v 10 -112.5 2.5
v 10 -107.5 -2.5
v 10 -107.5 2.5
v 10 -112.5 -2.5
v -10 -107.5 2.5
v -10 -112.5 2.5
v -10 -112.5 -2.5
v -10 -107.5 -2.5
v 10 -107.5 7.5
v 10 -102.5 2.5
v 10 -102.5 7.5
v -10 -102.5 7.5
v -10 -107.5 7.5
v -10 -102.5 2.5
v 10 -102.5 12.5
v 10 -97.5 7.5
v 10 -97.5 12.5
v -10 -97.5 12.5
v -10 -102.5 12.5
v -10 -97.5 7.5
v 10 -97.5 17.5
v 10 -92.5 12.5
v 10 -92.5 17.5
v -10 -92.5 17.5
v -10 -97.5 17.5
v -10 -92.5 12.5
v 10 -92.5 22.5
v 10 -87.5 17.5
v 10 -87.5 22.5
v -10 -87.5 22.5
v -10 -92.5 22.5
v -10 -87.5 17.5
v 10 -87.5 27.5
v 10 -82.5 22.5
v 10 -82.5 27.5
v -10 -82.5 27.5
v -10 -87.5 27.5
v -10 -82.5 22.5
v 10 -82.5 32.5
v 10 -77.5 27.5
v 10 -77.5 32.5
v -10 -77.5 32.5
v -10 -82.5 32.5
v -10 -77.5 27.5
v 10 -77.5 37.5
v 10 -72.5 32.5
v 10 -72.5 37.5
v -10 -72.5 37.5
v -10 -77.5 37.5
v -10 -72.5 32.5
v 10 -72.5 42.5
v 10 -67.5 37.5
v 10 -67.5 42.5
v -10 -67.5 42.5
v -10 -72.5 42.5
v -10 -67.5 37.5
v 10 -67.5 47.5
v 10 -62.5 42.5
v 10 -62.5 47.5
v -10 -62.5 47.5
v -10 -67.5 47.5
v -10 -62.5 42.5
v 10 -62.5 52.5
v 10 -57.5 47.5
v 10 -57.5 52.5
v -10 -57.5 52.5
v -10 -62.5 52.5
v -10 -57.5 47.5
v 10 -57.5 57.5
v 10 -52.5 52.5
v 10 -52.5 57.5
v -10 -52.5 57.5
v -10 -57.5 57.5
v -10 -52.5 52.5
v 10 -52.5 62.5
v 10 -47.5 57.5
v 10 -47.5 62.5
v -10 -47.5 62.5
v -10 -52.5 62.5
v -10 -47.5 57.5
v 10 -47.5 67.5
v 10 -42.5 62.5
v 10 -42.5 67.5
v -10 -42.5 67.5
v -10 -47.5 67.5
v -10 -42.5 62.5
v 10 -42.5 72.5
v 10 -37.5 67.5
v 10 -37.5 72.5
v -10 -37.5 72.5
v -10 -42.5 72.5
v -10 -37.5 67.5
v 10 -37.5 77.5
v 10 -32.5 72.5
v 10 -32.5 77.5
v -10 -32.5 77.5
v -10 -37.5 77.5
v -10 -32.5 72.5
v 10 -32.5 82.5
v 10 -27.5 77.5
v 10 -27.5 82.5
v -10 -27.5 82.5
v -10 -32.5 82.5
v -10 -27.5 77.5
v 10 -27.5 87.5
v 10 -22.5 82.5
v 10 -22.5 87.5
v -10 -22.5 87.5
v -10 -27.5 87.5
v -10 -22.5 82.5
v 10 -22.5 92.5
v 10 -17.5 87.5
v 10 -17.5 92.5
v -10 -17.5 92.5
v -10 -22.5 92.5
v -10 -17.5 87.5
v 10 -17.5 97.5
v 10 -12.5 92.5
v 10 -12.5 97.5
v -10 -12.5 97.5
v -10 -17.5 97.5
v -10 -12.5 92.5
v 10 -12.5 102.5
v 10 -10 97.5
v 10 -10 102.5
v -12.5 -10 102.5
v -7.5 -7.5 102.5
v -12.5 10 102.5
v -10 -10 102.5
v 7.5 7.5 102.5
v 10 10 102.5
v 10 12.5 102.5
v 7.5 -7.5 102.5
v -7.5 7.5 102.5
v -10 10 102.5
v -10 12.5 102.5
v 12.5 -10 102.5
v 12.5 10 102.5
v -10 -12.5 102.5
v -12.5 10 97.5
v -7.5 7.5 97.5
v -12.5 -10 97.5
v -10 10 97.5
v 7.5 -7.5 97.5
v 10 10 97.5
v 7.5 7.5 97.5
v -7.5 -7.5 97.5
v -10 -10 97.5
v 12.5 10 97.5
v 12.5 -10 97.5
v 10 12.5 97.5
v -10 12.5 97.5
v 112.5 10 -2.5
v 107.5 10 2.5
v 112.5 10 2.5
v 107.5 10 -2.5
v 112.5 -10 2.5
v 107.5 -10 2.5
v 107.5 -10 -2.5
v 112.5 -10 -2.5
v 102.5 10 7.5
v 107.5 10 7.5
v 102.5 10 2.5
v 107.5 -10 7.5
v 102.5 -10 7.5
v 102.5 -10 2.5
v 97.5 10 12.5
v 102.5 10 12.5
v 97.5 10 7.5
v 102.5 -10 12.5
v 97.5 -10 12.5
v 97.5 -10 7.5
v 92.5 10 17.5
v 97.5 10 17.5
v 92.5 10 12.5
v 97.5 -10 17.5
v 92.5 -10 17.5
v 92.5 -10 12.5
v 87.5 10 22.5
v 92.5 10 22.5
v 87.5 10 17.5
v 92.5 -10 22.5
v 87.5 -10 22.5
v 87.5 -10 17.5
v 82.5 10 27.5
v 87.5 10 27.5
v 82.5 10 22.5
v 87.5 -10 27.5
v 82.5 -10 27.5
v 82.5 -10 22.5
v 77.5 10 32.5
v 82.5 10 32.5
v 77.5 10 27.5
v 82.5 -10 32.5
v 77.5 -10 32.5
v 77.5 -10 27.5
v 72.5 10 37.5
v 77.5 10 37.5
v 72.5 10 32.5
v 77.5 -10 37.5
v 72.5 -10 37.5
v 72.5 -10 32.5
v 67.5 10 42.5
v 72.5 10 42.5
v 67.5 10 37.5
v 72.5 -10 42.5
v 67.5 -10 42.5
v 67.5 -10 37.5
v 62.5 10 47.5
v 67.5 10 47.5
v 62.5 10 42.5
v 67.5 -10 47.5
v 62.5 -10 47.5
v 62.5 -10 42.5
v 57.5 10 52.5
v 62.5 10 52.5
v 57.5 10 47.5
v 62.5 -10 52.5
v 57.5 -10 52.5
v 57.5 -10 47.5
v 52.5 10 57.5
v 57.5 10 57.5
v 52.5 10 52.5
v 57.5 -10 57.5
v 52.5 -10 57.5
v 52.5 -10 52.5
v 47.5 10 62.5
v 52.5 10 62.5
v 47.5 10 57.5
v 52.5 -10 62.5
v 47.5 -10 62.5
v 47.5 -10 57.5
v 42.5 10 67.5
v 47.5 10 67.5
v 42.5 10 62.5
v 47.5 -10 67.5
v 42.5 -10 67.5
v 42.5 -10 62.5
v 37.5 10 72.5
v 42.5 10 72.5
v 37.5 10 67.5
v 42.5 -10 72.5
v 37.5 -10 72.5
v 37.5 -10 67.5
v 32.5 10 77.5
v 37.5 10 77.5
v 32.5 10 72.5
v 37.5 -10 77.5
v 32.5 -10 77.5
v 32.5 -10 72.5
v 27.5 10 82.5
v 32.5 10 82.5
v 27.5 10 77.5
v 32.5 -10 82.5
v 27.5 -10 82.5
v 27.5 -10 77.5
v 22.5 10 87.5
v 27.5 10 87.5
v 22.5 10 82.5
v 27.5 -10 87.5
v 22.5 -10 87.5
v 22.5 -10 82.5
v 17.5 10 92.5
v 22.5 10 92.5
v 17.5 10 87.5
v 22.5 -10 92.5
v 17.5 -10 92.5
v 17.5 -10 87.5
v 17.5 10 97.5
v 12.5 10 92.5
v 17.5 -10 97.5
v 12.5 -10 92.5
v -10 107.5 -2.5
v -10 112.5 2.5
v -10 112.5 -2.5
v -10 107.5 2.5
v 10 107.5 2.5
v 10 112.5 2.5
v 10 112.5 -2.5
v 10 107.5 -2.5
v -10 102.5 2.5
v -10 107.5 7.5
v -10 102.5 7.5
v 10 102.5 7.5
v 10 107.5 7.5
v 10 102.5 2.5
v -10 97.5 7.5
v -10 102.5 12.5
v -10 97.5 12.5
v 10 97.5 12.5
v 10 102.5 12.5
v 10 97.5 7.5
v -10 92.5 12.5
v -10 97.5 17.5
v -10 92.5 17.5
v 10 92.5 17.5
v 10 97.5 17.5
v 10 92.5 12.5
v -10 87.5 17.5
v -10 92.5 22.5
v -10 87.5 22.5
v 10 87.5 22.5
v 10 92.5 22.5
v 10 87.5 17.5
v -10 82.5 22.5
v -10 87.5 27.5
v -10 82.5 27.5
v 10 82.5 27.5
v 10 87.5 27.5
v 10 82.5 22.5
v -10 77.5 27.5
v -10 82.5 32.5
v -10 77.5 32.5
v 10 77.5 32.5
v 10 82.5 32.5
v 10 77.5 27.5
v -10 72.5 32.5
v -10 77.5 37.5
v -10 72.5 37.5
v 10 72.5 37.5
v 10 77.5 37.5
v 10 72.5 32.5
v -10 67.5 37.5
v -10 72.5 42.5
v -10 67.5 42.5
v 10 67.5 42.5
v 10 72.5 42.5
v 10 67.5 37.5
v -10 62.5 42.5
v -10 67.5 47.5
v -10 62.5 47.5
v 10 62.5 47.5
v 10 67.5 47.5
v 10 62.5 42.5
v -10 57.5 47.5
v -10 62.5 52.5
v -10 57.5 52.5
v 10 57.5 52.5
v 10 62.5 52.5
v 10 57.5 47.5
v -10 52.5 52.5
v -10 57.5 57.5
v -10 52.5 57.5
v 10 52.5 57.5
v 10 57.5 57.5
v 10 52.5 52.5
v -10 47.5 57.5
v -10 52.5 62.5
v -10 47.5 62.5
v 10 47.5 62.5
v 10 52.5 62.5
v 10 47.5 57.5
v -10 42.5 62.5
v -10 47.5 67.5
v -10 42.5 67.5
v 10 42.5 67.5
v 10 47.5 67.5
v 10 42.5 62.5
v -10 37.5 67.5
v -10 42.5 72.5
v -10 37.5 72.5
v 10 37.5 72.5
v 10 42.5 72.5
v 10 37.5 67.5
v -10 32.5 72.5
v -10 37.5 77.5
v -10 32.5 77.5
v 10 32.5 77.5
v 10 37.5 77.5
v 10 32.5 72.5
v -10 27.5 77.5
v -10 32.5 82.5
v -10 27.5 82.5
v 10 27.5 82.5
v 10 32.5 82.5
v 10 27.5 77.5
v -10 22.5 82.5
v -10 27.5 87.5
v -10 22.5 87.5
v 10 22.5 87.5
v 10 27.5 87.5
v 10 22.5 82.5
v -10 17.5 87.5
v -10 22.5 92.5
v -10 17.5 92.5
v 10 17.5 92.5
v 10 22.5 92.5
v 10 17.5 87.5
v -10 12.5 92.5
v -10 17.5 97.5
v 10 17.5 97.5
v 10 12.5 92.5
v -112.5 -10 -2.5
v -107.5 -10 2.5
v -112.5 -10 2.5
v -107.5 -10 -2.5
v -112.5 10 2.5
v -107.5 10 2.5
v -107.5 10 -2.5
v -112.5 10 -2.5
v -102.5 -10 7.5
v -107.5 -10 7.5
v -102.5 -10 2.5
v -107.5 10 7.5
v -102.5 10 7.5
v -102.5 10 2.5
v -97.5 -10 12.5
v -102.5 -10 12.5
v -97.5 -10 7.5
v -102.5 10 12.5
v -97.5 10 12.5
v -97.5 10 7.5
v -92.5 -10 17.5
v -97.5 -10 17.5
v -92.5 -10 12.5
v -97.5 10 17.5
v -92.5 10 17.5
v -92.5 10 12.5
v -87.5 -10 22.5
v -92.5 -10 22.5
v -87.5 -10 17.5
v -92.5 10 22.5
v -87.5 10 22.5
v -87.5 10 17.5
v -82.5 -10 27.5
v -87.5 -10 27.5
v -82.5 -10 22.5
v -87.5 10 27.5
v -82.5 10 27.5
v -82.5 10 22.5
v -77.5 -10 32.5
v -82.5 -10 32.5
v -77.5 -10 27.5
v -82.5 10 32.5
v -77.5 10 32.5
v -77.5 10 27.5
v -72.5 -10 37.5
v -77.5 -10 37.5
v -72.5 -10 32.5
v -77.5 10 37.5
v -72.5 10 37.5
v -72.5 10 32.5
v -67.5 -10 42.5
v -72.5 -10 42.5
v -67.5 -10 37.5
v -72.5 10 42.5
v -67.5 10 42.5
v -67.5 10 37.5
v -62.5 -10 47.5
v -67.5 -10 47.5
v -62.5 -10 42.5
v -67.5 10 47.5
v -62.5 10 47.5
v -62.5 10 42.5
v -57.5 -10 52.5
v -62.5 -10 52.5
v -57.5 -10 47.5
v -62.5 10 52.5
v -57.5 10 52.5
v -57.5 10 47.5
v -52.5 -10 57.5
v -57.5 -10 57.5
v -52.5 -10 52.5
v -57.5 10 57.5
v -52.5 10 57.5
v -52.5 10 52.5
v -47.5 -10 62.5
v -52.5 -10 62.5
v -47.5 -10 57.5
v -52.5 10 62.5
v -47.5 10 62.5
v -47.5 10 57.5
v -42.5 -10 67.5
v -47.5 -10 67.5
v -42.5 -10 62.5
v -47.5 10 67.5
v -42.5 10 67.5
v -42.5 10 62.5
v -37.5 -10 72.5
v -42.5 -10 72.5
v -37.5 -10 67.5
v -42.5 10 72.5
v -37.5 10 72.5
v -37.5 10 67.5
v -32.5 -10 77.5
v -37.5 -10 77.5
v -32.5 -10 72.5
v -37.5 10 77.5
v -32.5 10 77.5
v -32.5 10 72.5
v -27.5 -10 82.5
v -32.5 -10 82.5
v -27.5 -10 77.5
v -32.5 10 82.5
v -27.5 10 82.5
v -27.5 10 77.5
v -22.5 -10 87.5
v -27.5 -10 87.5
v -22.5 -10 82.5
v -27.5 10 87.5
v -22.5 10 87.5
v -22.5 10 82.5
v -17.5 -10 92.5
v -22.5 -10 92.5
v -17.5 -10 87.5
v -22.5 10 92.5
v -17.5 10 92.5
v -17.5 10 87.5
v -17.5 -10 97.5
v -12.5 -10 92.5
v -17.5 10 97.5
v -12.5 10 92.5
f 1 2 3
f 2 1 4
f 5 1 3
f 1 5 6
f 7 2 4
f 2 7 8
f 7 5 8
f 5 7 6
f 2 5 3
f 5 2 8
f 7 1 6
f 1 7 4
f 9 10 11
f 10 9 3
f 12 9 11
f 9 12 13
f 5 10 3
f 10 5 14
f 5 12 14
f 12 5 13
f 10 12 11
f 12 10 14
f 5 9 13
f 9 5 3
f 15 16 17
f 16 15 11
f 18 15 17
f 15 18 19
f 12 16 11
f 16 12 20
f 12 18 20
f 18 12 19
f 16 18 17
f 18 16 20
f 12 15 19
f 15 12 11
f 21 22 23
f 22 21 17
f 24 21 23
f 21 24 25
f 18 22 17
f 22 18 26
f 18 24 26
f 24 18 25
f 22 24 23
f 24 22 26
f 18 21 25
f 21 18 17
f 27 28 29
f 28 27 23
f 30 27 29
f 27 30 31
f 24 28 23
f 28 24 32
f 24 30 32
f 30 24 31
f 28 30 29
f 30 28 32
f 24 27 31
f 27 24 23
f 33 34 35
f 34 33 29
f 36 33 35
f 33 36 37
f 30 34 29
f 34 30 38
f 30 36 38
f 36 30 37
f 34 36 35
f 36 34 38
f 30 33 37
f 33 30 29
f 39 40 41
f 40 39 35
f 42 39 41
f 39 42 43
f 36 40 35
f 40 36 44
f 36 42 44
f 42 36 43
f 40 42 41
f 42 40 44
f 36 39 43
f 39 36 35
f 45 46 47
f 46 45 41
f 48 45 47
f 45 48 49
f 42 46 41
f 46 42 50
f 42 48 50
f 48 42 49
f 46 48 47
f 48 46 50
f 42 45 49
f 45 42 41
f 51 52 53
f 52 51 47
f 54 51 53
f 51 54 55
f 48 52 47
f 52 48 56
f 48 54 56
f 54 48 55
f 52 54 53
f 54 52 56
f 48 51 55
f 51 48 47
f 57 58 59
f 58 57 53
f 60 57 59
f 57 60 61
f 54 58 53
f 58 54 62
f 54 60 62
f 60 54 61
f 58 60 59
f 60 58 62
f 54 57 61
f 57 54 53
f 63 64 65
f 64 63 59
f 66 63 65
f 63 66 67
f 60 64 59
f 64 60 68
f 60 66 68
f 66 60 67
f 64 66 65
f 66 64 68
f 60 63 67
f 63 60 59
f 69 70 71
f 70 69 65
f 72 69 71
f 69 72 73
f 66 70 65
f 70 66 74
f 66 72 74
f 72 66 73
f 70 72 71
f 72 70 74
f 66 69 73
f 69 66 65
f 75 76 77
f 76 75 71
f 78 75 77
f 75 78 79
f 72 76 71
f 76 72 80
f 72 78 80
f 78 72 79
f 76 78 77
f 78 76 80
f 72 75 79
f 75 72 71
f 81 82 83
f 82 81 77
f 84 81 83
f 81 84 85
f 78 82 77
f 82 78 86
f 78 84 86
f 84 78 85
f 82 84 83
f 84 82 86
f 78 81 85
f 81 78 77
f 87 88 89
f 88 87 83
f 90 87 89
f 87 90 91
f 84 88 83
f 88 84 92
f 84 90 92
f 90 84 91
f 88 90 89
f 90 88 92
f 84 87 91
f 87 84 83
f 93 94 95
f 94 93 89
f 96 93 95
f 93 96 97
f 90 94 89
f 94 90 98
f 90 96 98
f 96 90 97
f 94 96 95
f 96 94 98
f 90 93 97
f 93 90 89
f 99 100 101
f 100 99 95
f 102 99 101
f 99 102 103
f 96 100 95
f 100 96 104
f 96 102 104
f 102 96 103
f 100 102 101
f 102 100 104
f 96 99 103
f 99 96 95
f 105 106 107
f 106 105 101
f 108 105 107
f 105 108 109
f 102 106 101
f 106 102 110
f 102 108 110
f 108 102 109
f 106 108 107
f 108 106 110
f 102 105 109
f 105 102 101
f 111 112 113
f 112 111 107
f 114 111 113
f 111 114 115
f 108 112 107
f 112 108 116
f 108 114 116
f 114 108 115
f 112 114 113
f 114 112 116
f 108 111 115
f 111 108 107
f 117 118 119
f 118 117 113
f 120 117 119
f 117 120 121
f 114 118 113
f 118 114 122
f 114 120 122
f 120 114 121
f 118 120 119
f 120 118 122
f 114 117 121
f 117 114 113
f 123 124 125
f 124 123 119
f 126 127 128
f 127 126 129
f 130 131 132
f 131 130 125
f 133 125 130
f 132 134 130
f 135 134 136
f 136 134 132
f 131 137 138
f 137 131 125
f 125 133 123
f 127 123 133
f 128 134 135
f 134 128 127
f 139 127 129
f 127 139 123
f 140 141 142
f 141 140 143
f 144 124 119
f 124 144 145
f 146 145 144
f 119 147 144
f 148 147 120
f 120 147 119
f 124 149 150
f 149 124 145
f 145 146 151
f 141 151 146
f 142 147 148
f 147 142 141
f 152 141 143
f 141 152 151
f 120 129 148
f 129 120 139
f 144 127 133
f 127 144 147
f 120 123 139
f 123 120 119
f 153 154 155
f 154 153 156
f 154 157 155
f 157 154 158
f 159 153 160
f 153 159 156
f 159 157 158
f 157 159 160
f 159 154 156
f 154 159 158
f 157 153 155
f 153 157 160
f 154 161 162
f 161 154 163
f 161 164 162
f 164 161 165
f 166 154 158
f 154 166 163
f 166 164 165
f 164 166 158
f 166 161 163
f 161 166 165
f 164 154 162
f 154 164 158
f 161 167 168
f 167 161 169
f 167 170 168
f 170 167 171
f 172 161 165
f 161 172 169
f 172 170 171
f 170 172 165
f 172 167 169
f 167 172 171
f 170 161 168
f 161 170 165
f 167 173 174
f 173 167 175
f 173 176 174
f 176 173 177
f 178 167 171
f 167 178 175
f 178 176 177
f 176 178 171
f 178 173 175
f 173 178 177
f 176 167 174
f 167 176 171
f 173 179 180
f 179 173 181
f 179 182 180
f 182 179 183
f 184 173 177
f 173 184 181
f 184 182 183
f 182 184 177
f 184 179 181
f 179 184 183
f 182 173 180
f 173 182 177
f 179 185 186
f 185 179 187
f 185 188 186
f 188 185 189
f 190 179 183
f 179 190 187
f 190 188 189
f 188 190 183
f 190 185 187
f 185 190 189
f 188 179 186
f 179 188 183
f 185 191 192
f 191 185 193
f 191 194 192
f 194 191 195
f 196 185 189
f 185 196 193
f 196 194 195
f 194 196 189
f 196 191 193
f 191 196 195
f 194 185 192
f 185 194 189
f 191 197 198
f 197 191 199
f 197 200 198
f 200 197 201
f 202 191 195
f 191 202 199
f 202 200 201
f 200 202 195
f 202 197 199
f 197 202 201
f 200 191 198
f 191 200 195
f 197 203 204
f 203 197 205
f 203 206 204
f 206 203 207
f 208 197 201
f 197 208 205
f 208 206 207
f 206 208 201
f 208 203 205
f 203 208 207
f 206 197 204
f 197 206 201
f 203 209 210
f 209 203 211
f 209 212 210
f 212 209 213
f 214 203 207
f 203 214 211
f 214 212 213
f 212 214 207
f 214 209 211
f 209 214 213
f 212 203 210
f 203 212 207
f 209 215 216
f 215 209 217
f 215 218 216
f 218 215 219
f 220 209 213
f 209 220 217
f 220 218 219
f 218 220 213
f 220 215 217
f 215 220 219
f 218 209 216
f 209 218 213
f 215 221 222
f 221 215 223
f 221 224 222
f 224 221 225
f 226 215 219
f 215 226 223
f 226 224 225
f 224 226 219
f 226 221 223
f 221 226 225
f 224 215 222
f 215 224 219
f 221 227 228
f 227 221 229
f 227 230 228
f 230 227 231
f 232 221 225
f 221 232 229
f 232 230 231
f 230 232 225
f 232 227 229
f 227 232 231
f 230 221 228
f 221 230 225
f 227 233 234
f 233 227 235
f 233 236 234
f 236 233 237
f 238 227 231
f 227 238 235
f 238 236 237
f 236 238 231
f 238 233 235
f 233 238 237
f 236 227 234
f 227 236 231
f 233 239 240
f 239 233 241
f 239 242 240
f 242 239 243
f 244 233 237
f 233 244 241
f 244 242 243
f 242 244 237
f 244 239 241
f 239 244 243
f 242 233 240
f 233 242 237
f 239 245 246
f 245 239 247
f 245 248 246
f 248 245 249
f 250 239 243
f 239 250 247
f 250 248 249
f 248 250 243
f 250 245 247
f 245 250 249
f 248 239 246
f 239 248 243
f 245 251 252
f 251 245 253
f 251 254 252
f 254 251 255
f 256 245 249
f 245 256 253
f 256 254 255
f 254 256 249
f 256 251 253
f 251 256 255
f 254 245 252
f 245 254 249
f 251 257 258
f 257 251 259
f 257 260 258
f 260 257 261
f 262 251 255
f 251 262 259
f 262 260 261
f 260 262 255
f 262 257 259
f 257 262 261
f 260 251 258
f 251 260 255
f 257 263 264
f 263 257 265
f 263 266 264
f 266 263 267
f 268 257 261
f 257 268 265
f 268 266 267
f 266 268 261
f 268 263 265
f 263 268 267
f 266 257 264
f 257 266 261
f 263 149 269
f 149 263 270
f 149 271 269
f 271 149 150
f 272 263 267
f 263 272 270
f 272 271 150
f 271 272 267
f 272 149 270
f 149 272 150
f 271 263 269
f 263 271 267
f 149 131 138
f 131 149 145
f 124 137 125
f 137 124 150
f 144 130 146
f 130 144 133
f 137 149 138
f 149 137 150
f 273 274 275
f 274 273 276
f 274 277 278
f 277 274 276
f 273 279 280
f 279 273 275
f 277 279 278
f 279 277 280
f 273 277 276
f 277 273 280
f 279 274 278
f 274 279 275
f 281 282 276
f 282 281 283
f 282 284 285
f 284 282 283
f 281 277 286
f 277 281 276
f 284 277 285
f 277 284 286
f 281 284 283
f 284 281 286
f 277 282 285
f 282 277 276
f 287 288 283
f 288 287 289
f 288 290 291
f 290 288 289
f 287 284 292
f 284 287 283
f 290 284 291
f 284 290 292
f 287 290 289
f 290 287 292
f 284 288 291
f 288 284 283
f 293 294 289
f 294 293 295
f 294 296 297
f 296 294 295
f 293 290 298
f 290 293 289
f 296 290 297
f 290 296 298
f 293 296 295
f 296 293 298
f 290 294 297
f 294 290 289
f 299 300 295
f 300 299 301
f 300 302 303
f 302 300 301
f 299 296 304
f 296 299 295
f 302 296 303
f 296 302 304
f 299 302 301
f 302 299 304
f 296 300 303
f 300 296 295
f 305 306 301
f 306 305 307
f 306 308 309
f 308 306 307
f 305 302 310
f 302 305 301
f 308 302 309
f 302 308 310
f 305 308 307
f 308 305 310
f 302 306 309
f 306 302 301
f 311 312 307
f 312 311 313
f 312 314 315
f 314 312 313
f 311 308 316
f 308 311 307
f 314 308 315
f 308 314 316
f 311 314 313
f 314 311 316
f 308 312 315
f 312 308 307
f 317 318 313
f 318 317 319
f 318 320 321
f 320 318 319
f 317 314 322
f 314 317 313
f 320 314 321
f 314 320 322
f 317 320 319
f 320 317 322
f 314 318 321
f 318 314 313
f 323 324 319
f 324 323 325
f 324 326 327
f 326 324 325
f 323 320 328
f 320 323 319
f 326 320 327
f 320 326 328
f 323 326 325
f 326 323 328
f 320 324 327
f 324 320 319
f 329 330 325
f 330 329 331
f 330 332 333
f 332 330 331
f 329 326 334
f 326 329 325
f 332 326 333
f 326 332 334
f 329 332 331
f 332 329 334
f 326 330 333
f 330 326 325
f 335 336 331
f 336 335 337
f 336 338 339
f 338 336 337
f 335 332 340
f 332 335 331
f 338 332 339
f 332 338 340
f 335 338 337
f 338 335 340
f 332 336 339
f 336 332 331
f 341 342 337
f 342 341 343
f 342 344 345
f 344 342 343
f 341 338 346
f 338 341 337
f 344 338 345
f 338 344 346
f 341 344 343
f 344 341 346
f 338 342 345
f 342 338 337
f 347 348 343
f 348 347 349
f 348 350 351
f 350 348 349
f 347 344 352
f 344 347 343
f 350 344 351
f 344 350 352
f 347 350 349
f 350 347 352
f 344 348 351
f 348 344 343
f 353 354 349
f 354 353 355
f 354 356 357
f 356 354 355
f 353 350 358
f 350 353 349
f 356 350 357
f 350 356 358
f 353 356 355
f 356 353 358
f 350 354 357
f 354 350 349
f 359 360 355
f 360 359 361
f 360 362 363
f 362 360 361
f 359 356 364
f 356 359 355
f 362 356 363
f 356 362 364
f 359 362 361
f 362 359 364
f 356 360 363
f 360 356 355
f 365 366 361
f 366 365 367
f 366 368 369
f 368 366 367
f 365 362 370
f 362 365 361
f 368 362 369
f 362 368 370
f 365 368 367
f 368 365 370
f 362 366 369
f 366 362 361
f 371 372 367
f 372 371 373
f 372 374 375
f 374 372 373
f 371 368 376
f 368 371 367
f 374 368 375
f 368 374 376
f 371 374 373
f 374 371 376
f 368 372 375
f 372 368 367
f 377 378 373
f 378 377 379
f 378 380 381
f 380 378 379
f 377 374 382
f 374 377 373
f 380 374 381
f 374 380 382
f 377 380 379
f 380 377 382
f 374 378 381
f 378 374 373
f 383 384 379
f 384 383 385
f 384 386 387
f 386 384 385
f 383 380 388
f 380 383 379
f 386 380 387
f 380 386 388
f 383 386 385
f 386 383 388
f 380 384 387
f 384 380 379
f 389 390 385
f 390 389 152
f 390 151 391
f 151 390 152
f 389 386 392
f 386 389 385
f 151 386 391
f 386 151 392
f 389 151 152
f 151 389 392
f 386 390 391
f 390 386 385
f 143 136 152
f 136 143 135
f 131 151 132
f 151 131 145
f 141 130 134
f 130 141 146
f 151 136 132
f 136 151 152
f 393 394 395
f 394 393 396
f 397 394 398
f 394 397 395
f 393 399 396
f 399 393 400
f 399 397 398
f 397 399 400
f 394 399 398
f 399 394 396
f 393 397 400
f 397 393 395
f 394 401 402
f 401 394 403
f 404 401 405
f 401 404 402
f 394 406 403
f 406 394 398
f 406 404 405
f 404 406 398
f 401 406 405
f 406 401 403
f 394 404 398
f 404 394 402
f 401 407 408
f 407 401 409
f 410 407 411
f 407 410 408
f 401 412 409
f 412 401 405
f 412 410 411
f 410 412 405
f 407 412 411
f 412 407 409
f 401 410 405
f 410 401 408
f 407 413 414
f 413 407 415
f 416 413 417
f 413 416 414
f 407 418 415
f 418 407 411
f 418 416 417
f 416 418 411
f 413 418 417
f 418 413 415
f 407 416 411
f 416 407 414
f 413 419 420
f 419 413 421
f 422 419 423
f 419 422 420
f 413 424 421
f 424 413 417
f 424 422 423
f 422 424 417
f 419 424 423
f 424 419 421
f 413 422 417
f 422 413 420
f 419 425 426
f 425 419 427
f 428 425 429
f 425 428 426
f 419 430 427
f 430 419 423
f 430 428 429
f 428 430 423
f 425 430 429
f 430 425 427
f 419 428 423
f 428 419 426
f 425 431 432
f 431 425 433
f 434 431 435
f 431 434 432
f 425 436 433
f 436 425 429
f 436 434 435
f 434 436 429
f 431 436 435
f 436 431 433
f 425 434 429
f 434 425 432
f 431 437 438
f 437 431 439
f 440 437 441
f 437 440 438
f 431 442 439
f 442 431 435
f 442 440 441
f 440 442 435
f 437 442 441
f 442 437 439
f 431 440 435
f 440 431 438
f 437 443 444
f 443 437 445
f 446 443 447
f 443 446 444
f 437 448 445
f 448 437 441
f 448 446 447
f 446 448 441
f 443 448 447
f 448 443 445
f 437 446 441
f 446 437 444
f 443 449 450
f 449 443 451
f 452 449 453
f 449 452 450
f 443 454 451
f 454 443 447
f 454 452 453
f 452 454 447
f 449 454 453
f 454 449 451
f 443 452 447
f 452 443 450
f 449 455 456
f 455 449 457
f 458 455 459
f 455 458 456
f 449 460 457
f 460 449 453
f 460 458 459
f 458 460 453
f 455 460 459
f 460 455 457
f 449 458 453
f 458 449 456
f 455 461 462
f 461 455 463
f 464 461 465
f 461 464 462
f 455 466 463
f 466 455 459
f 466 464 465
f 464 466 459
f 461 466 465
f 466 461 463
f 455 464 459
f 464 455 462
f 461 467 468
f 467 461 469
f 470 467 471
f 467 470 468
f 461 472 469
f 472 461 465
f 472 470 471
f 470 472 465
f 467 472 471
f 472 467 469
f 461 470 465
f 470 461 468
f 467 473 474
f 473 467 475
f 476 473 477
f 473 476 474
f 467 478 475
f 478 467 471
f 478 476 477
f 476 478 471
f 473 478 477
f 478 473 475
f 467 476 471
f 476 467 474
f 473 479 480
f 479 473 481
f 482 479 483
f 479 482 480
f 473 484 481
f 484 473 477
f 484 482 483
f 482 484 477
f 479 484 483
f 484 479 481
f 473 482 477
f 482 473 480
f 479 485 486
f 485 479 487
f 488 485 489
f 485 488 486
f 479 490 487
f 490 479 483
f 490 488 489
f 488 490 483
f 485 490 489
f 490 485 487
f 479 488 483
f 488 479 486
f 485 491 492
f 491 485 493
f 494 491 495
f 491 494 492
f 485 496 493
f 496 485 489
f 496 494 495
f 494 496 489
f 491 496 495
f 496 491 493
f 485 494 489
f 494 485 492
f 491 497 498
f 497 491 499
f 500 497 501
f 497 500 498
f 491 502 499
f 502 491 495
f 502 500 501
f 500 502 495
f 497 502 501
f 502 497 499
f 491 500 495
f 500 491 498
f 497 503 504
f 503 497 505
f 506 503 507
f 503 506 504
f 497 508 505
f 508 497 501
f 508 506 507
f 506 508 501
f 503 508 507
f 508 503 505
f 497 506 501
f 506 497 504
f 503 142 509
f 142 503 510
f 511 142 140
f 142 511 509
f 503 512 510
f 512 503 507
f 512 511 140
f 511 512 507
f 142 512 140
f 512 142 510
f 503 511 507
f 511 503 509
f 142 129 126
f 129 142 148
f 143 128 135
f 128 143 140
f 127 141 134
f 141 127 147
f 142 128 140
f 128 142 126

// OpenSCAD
for (s1=[0:90:270]) {
  rotate([0, 0, s1]) {
    translate([0, -110, 0]) {
      for (s2=[0:5:100]) {
        translate([0, s2, s2]) {
          cube([20, 5, 5], center=true);
        }
      }
      
    }
  }
  
}
